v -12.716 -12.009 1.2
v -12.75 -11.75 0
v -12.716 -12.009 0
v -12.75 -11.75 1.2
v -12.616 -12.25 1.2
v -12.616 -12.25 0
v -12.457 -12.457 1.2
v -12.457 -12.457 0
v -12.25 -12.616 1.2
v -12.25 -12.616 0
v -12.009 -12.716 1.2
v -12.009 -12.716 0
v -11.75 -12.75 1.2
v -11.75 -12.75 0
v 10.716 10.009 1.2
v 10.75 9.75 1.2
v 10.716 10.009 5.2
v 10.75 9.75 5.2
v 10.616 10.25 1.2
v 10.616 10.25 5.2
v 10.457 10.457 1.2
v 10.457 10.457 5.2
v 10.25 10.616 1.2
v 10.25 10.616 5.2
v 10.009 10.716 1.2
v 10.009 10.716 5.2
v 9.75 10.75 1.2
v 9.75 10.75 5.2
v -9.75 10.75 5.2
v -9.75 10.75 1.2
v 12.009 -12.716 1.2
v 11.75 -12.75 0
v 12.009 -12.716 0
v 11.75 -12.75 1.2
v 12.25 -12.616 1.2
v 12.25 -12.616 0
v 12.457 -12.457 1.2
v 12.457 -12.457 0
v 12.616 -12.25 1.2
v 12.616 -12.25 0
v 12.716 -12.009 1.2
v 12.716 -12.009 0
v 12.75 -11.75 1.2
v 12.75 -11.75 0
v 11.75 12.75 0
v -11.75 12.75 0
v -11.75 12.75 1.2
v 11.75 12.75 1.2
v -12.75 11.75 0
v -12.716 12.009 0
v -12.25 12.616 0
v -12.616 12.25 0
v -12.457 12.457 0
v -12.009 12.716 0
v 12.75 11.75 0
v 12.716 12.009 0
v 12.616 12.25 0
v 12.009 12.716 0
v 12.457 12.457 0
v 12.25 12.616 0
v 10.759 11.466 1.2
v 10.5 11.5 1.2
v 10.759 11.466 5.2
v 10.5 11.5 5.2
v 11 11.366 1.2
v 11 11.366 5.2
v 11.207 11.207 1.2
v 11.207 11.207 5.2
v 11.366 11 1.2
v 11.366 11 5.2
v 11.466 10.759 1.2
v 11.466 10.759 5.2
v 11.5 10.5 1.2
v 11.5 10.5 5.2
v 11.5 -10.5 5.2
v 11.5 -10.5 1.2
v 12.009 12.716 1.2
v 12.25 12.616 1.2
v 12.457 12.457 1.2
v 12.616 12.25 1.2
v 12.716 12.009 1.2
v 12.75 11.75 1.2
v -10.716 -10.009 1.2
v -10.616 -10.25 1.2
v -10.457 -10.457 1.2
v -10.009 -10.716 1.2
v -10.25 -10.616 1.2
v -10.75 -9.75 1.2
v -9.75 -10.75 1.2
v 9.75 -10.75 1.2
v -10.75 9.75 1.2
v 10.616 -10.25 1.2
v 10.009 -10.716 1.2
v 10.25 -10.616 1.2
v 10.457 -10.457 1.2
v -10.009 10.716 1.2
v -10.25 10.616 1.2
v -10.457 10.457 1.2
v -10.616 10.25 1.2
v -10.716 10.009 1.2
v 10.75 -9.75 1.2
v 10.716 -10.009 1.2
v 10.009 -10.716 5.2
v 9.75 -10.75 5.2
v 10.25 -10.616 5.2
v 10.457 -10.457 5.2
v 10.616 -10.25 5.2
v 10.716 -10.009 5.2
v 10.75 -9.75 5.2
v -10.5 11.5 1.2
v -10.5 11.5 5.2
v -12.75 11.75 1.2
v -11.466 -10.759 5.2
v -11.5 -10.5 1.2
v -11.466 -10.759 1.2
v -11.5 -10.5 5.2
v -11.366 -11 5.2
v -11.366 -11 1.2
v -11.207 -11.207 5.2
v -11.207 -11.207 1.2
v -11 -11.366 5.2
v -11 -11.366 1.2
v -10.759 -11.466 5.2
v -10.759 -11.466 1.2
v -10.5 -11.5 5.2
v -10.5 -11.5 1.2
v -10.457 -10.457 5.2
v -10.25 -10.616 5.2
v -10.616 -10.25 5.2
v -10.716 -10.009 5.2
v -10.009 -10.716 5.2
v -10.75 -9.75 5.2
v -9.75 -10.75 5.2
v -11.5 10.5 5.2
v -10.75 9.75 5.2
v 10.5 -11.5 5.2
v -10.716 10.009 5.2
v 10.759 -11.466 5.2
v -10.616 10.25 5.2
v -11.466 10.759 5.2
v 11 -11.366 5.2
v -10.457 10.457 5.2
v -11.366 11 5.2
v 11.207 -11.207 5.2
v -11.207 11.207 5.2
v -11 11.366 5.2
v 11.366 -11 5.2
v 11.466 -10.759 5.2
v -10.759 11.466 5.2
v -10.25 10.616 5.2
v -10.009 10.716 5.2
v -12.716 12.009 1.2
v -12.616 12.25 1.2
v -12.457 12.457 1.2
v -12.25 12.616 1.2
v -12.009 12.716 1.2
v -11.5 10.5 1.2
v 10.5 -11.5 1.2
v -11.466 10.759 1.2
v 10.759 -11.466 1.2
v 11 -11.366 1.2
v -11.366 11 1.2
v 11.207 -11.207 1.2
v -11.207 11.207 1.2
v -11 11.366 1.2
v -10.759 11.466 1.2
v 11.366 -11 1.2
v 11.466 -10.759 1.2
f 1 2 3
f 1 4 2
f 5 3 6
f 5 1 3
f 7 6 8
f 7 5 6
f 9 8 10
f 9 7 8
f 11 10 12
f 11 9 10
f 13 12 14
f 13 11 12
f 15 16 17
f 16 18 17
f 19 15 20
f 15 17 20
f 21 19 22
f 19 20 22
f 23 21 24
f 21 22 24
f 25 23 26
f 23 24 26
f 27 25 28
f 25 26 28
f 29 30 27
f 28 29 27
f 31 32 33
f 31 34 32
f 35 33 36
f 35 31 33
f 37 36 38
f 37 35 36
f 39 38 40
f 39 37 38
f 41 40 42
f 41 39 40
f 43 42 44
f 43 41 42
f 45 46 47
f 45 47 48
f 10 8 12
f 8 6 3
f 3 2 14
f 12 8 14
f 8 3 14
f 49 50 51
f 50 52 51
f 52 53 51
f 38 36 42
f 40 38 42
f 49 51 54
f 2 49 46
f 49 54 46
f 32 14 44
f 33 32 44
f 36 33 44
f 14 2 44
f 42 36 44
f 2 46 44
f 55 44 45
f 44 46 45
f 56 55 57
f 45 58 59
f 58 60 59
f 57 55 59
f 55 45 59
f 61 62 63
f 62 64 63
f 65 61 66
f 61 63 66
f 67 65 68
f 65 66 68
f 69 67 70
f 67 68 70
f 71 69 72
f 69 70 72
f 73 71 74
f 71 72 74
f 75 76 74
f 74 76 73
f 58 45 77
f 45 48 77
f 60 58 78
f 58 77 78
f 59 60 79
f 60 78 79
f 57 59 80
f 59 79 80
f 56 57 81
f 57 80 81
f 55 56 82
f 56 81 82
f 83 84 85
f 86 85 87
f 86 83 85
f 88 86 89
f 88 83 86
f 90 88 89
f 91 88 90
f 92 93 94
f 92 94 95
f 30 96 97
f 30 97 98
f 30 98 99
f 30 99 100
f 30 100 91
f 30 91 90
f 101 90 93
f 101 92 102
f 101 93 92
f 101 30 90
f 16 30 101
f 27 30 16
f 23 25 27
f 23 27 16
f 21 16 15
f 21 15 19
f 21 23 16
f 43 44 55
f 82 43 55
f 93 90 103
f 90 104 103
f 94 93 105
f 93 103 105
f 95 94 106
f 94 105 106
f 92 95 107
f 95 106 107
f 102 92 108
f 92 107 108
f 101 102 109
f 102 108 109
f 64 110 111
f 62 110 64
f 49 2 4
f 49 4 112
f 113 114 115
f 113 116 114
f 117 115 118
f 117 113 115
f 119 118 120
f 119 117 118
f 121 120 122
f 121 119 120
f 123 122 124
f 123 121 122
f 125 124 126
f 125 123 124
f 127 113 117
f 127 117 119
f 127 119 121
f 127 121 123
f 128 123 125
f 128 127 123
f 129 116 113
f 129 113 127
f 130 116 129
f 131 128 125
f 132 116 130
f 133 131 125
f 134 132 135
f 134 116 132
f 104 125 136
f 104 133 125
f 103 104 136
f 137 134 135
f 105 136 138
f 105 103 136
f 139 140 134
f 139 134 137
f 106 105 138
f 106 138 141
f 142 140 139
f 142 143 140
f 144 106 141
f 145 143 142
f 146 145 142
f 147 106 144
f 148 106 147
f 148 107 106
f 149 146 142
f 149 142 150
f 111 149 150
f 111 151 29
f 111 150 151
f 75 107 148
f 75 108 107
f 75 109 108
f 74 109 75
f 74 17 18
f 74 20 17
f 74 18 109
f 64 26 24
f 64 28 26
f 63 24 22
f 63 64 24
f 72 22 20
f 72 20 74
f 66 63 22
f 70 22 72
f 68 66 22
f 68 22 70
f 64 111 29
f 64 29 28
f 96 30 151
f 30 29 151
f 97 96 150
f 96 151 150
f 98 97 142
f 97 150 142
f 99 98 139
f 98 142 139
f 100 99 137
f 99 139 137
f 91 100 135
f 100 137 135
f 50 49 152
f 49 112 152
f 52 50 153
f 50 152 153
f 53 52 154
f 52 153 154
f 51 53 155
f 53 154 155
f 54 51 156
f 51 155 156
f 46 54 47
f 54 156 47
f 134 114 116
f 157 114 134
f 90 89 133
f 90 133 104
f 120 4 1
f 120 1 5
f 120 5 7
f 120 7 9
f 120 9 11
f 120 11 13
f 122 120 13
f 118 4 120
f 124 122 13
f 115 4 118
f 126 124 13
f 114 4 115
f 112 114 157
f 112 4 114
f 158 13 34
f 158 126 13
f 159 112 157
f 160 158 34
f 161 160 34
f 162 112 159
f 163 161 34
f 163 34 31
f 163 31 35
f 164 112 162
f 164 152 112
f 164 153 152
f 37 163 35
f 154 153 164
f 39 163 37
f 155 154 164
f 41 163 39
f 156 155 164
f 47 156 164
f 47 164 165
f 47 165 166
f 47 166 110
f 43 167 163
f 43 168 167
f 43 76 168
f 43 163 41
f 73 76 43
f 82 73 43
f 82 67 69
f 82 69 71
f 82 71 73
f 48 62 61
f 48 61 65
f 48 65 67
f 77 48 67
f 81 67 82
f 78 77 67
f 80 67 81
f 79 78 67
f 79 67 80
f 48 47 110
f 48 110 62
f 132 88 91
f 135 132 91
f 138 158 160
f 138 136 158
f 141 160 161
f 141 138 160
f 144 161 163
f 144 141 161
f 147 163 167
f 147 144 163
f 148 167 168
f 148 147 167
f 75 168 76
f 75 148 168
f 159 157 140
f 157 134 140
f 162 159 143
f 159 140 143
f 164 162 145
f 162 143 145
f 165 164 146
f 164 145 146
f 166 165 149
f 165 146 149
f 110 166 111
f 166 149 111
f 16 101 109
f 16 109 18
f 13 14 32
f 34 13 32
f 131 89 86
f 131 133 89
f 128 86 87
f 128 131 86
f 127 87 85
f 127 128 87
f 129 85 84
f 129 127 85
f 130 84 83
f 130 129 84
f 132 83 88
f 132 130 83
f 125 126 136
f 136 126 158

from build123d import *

# Parameters (mm, degrees)
F0_W     = 25.5
F0_H     = 25.5
F1_DEPTH = 1.2
F2_W     = 23
F2_H     = 23
F2_W_2   = 21.5
F2_H_2   = 21.5
F3_DEPTH = 4
F4_R     = 1
F5_R     = 1


with BuildPart() as f1:
    # F0 (on Top) → F1 (new body)
    with BuildSketch(Plane.XY):
        Rectangle(F0_W, F0_H)
    extrude(amount=F1_DEPTH)

    # F2 (on face) → F3 (join)
    with BuildSketch(Plane.XY.offset(1.2)):
        Rectangle(F2_W, F2_H)
        Rectangle(F2_W_2, F2_H_2, mode=Mode.SUBTRACT)
    extrude(amount=F3_DEPTH)

    # F4
    f4_edges = [f1.edges().sort_by_distance(p)[0] for p in [
        (-10.75, 10.75, 3.2),
        (10.75, 10.75, 3.2),
        (10.75, -10.75, 3.2),
        (-10.75, -10.75, 3.2),
    ]]
    fillet(f4_edges, radius=F4_R)

    # F5
    f5_edges = [f1.edges().sort_by_distance(p)[0] for p in [
        (11.5, 11.5, 3.2),
        (11.5, -11.5, 3.2),
        (-11.5, 11.5, 3.2),
        (-11.5, -11.5, 3.2),
        (-12.75, 12.75, 0.6),
        (12.75, 12.75, 0.6),
        (12.75, -12.75, 0.6),
        (-12.75, -12.75, 0.6),
    ]]
    fillet(f5_edges, radius=F5_R)


solid = f1.part
